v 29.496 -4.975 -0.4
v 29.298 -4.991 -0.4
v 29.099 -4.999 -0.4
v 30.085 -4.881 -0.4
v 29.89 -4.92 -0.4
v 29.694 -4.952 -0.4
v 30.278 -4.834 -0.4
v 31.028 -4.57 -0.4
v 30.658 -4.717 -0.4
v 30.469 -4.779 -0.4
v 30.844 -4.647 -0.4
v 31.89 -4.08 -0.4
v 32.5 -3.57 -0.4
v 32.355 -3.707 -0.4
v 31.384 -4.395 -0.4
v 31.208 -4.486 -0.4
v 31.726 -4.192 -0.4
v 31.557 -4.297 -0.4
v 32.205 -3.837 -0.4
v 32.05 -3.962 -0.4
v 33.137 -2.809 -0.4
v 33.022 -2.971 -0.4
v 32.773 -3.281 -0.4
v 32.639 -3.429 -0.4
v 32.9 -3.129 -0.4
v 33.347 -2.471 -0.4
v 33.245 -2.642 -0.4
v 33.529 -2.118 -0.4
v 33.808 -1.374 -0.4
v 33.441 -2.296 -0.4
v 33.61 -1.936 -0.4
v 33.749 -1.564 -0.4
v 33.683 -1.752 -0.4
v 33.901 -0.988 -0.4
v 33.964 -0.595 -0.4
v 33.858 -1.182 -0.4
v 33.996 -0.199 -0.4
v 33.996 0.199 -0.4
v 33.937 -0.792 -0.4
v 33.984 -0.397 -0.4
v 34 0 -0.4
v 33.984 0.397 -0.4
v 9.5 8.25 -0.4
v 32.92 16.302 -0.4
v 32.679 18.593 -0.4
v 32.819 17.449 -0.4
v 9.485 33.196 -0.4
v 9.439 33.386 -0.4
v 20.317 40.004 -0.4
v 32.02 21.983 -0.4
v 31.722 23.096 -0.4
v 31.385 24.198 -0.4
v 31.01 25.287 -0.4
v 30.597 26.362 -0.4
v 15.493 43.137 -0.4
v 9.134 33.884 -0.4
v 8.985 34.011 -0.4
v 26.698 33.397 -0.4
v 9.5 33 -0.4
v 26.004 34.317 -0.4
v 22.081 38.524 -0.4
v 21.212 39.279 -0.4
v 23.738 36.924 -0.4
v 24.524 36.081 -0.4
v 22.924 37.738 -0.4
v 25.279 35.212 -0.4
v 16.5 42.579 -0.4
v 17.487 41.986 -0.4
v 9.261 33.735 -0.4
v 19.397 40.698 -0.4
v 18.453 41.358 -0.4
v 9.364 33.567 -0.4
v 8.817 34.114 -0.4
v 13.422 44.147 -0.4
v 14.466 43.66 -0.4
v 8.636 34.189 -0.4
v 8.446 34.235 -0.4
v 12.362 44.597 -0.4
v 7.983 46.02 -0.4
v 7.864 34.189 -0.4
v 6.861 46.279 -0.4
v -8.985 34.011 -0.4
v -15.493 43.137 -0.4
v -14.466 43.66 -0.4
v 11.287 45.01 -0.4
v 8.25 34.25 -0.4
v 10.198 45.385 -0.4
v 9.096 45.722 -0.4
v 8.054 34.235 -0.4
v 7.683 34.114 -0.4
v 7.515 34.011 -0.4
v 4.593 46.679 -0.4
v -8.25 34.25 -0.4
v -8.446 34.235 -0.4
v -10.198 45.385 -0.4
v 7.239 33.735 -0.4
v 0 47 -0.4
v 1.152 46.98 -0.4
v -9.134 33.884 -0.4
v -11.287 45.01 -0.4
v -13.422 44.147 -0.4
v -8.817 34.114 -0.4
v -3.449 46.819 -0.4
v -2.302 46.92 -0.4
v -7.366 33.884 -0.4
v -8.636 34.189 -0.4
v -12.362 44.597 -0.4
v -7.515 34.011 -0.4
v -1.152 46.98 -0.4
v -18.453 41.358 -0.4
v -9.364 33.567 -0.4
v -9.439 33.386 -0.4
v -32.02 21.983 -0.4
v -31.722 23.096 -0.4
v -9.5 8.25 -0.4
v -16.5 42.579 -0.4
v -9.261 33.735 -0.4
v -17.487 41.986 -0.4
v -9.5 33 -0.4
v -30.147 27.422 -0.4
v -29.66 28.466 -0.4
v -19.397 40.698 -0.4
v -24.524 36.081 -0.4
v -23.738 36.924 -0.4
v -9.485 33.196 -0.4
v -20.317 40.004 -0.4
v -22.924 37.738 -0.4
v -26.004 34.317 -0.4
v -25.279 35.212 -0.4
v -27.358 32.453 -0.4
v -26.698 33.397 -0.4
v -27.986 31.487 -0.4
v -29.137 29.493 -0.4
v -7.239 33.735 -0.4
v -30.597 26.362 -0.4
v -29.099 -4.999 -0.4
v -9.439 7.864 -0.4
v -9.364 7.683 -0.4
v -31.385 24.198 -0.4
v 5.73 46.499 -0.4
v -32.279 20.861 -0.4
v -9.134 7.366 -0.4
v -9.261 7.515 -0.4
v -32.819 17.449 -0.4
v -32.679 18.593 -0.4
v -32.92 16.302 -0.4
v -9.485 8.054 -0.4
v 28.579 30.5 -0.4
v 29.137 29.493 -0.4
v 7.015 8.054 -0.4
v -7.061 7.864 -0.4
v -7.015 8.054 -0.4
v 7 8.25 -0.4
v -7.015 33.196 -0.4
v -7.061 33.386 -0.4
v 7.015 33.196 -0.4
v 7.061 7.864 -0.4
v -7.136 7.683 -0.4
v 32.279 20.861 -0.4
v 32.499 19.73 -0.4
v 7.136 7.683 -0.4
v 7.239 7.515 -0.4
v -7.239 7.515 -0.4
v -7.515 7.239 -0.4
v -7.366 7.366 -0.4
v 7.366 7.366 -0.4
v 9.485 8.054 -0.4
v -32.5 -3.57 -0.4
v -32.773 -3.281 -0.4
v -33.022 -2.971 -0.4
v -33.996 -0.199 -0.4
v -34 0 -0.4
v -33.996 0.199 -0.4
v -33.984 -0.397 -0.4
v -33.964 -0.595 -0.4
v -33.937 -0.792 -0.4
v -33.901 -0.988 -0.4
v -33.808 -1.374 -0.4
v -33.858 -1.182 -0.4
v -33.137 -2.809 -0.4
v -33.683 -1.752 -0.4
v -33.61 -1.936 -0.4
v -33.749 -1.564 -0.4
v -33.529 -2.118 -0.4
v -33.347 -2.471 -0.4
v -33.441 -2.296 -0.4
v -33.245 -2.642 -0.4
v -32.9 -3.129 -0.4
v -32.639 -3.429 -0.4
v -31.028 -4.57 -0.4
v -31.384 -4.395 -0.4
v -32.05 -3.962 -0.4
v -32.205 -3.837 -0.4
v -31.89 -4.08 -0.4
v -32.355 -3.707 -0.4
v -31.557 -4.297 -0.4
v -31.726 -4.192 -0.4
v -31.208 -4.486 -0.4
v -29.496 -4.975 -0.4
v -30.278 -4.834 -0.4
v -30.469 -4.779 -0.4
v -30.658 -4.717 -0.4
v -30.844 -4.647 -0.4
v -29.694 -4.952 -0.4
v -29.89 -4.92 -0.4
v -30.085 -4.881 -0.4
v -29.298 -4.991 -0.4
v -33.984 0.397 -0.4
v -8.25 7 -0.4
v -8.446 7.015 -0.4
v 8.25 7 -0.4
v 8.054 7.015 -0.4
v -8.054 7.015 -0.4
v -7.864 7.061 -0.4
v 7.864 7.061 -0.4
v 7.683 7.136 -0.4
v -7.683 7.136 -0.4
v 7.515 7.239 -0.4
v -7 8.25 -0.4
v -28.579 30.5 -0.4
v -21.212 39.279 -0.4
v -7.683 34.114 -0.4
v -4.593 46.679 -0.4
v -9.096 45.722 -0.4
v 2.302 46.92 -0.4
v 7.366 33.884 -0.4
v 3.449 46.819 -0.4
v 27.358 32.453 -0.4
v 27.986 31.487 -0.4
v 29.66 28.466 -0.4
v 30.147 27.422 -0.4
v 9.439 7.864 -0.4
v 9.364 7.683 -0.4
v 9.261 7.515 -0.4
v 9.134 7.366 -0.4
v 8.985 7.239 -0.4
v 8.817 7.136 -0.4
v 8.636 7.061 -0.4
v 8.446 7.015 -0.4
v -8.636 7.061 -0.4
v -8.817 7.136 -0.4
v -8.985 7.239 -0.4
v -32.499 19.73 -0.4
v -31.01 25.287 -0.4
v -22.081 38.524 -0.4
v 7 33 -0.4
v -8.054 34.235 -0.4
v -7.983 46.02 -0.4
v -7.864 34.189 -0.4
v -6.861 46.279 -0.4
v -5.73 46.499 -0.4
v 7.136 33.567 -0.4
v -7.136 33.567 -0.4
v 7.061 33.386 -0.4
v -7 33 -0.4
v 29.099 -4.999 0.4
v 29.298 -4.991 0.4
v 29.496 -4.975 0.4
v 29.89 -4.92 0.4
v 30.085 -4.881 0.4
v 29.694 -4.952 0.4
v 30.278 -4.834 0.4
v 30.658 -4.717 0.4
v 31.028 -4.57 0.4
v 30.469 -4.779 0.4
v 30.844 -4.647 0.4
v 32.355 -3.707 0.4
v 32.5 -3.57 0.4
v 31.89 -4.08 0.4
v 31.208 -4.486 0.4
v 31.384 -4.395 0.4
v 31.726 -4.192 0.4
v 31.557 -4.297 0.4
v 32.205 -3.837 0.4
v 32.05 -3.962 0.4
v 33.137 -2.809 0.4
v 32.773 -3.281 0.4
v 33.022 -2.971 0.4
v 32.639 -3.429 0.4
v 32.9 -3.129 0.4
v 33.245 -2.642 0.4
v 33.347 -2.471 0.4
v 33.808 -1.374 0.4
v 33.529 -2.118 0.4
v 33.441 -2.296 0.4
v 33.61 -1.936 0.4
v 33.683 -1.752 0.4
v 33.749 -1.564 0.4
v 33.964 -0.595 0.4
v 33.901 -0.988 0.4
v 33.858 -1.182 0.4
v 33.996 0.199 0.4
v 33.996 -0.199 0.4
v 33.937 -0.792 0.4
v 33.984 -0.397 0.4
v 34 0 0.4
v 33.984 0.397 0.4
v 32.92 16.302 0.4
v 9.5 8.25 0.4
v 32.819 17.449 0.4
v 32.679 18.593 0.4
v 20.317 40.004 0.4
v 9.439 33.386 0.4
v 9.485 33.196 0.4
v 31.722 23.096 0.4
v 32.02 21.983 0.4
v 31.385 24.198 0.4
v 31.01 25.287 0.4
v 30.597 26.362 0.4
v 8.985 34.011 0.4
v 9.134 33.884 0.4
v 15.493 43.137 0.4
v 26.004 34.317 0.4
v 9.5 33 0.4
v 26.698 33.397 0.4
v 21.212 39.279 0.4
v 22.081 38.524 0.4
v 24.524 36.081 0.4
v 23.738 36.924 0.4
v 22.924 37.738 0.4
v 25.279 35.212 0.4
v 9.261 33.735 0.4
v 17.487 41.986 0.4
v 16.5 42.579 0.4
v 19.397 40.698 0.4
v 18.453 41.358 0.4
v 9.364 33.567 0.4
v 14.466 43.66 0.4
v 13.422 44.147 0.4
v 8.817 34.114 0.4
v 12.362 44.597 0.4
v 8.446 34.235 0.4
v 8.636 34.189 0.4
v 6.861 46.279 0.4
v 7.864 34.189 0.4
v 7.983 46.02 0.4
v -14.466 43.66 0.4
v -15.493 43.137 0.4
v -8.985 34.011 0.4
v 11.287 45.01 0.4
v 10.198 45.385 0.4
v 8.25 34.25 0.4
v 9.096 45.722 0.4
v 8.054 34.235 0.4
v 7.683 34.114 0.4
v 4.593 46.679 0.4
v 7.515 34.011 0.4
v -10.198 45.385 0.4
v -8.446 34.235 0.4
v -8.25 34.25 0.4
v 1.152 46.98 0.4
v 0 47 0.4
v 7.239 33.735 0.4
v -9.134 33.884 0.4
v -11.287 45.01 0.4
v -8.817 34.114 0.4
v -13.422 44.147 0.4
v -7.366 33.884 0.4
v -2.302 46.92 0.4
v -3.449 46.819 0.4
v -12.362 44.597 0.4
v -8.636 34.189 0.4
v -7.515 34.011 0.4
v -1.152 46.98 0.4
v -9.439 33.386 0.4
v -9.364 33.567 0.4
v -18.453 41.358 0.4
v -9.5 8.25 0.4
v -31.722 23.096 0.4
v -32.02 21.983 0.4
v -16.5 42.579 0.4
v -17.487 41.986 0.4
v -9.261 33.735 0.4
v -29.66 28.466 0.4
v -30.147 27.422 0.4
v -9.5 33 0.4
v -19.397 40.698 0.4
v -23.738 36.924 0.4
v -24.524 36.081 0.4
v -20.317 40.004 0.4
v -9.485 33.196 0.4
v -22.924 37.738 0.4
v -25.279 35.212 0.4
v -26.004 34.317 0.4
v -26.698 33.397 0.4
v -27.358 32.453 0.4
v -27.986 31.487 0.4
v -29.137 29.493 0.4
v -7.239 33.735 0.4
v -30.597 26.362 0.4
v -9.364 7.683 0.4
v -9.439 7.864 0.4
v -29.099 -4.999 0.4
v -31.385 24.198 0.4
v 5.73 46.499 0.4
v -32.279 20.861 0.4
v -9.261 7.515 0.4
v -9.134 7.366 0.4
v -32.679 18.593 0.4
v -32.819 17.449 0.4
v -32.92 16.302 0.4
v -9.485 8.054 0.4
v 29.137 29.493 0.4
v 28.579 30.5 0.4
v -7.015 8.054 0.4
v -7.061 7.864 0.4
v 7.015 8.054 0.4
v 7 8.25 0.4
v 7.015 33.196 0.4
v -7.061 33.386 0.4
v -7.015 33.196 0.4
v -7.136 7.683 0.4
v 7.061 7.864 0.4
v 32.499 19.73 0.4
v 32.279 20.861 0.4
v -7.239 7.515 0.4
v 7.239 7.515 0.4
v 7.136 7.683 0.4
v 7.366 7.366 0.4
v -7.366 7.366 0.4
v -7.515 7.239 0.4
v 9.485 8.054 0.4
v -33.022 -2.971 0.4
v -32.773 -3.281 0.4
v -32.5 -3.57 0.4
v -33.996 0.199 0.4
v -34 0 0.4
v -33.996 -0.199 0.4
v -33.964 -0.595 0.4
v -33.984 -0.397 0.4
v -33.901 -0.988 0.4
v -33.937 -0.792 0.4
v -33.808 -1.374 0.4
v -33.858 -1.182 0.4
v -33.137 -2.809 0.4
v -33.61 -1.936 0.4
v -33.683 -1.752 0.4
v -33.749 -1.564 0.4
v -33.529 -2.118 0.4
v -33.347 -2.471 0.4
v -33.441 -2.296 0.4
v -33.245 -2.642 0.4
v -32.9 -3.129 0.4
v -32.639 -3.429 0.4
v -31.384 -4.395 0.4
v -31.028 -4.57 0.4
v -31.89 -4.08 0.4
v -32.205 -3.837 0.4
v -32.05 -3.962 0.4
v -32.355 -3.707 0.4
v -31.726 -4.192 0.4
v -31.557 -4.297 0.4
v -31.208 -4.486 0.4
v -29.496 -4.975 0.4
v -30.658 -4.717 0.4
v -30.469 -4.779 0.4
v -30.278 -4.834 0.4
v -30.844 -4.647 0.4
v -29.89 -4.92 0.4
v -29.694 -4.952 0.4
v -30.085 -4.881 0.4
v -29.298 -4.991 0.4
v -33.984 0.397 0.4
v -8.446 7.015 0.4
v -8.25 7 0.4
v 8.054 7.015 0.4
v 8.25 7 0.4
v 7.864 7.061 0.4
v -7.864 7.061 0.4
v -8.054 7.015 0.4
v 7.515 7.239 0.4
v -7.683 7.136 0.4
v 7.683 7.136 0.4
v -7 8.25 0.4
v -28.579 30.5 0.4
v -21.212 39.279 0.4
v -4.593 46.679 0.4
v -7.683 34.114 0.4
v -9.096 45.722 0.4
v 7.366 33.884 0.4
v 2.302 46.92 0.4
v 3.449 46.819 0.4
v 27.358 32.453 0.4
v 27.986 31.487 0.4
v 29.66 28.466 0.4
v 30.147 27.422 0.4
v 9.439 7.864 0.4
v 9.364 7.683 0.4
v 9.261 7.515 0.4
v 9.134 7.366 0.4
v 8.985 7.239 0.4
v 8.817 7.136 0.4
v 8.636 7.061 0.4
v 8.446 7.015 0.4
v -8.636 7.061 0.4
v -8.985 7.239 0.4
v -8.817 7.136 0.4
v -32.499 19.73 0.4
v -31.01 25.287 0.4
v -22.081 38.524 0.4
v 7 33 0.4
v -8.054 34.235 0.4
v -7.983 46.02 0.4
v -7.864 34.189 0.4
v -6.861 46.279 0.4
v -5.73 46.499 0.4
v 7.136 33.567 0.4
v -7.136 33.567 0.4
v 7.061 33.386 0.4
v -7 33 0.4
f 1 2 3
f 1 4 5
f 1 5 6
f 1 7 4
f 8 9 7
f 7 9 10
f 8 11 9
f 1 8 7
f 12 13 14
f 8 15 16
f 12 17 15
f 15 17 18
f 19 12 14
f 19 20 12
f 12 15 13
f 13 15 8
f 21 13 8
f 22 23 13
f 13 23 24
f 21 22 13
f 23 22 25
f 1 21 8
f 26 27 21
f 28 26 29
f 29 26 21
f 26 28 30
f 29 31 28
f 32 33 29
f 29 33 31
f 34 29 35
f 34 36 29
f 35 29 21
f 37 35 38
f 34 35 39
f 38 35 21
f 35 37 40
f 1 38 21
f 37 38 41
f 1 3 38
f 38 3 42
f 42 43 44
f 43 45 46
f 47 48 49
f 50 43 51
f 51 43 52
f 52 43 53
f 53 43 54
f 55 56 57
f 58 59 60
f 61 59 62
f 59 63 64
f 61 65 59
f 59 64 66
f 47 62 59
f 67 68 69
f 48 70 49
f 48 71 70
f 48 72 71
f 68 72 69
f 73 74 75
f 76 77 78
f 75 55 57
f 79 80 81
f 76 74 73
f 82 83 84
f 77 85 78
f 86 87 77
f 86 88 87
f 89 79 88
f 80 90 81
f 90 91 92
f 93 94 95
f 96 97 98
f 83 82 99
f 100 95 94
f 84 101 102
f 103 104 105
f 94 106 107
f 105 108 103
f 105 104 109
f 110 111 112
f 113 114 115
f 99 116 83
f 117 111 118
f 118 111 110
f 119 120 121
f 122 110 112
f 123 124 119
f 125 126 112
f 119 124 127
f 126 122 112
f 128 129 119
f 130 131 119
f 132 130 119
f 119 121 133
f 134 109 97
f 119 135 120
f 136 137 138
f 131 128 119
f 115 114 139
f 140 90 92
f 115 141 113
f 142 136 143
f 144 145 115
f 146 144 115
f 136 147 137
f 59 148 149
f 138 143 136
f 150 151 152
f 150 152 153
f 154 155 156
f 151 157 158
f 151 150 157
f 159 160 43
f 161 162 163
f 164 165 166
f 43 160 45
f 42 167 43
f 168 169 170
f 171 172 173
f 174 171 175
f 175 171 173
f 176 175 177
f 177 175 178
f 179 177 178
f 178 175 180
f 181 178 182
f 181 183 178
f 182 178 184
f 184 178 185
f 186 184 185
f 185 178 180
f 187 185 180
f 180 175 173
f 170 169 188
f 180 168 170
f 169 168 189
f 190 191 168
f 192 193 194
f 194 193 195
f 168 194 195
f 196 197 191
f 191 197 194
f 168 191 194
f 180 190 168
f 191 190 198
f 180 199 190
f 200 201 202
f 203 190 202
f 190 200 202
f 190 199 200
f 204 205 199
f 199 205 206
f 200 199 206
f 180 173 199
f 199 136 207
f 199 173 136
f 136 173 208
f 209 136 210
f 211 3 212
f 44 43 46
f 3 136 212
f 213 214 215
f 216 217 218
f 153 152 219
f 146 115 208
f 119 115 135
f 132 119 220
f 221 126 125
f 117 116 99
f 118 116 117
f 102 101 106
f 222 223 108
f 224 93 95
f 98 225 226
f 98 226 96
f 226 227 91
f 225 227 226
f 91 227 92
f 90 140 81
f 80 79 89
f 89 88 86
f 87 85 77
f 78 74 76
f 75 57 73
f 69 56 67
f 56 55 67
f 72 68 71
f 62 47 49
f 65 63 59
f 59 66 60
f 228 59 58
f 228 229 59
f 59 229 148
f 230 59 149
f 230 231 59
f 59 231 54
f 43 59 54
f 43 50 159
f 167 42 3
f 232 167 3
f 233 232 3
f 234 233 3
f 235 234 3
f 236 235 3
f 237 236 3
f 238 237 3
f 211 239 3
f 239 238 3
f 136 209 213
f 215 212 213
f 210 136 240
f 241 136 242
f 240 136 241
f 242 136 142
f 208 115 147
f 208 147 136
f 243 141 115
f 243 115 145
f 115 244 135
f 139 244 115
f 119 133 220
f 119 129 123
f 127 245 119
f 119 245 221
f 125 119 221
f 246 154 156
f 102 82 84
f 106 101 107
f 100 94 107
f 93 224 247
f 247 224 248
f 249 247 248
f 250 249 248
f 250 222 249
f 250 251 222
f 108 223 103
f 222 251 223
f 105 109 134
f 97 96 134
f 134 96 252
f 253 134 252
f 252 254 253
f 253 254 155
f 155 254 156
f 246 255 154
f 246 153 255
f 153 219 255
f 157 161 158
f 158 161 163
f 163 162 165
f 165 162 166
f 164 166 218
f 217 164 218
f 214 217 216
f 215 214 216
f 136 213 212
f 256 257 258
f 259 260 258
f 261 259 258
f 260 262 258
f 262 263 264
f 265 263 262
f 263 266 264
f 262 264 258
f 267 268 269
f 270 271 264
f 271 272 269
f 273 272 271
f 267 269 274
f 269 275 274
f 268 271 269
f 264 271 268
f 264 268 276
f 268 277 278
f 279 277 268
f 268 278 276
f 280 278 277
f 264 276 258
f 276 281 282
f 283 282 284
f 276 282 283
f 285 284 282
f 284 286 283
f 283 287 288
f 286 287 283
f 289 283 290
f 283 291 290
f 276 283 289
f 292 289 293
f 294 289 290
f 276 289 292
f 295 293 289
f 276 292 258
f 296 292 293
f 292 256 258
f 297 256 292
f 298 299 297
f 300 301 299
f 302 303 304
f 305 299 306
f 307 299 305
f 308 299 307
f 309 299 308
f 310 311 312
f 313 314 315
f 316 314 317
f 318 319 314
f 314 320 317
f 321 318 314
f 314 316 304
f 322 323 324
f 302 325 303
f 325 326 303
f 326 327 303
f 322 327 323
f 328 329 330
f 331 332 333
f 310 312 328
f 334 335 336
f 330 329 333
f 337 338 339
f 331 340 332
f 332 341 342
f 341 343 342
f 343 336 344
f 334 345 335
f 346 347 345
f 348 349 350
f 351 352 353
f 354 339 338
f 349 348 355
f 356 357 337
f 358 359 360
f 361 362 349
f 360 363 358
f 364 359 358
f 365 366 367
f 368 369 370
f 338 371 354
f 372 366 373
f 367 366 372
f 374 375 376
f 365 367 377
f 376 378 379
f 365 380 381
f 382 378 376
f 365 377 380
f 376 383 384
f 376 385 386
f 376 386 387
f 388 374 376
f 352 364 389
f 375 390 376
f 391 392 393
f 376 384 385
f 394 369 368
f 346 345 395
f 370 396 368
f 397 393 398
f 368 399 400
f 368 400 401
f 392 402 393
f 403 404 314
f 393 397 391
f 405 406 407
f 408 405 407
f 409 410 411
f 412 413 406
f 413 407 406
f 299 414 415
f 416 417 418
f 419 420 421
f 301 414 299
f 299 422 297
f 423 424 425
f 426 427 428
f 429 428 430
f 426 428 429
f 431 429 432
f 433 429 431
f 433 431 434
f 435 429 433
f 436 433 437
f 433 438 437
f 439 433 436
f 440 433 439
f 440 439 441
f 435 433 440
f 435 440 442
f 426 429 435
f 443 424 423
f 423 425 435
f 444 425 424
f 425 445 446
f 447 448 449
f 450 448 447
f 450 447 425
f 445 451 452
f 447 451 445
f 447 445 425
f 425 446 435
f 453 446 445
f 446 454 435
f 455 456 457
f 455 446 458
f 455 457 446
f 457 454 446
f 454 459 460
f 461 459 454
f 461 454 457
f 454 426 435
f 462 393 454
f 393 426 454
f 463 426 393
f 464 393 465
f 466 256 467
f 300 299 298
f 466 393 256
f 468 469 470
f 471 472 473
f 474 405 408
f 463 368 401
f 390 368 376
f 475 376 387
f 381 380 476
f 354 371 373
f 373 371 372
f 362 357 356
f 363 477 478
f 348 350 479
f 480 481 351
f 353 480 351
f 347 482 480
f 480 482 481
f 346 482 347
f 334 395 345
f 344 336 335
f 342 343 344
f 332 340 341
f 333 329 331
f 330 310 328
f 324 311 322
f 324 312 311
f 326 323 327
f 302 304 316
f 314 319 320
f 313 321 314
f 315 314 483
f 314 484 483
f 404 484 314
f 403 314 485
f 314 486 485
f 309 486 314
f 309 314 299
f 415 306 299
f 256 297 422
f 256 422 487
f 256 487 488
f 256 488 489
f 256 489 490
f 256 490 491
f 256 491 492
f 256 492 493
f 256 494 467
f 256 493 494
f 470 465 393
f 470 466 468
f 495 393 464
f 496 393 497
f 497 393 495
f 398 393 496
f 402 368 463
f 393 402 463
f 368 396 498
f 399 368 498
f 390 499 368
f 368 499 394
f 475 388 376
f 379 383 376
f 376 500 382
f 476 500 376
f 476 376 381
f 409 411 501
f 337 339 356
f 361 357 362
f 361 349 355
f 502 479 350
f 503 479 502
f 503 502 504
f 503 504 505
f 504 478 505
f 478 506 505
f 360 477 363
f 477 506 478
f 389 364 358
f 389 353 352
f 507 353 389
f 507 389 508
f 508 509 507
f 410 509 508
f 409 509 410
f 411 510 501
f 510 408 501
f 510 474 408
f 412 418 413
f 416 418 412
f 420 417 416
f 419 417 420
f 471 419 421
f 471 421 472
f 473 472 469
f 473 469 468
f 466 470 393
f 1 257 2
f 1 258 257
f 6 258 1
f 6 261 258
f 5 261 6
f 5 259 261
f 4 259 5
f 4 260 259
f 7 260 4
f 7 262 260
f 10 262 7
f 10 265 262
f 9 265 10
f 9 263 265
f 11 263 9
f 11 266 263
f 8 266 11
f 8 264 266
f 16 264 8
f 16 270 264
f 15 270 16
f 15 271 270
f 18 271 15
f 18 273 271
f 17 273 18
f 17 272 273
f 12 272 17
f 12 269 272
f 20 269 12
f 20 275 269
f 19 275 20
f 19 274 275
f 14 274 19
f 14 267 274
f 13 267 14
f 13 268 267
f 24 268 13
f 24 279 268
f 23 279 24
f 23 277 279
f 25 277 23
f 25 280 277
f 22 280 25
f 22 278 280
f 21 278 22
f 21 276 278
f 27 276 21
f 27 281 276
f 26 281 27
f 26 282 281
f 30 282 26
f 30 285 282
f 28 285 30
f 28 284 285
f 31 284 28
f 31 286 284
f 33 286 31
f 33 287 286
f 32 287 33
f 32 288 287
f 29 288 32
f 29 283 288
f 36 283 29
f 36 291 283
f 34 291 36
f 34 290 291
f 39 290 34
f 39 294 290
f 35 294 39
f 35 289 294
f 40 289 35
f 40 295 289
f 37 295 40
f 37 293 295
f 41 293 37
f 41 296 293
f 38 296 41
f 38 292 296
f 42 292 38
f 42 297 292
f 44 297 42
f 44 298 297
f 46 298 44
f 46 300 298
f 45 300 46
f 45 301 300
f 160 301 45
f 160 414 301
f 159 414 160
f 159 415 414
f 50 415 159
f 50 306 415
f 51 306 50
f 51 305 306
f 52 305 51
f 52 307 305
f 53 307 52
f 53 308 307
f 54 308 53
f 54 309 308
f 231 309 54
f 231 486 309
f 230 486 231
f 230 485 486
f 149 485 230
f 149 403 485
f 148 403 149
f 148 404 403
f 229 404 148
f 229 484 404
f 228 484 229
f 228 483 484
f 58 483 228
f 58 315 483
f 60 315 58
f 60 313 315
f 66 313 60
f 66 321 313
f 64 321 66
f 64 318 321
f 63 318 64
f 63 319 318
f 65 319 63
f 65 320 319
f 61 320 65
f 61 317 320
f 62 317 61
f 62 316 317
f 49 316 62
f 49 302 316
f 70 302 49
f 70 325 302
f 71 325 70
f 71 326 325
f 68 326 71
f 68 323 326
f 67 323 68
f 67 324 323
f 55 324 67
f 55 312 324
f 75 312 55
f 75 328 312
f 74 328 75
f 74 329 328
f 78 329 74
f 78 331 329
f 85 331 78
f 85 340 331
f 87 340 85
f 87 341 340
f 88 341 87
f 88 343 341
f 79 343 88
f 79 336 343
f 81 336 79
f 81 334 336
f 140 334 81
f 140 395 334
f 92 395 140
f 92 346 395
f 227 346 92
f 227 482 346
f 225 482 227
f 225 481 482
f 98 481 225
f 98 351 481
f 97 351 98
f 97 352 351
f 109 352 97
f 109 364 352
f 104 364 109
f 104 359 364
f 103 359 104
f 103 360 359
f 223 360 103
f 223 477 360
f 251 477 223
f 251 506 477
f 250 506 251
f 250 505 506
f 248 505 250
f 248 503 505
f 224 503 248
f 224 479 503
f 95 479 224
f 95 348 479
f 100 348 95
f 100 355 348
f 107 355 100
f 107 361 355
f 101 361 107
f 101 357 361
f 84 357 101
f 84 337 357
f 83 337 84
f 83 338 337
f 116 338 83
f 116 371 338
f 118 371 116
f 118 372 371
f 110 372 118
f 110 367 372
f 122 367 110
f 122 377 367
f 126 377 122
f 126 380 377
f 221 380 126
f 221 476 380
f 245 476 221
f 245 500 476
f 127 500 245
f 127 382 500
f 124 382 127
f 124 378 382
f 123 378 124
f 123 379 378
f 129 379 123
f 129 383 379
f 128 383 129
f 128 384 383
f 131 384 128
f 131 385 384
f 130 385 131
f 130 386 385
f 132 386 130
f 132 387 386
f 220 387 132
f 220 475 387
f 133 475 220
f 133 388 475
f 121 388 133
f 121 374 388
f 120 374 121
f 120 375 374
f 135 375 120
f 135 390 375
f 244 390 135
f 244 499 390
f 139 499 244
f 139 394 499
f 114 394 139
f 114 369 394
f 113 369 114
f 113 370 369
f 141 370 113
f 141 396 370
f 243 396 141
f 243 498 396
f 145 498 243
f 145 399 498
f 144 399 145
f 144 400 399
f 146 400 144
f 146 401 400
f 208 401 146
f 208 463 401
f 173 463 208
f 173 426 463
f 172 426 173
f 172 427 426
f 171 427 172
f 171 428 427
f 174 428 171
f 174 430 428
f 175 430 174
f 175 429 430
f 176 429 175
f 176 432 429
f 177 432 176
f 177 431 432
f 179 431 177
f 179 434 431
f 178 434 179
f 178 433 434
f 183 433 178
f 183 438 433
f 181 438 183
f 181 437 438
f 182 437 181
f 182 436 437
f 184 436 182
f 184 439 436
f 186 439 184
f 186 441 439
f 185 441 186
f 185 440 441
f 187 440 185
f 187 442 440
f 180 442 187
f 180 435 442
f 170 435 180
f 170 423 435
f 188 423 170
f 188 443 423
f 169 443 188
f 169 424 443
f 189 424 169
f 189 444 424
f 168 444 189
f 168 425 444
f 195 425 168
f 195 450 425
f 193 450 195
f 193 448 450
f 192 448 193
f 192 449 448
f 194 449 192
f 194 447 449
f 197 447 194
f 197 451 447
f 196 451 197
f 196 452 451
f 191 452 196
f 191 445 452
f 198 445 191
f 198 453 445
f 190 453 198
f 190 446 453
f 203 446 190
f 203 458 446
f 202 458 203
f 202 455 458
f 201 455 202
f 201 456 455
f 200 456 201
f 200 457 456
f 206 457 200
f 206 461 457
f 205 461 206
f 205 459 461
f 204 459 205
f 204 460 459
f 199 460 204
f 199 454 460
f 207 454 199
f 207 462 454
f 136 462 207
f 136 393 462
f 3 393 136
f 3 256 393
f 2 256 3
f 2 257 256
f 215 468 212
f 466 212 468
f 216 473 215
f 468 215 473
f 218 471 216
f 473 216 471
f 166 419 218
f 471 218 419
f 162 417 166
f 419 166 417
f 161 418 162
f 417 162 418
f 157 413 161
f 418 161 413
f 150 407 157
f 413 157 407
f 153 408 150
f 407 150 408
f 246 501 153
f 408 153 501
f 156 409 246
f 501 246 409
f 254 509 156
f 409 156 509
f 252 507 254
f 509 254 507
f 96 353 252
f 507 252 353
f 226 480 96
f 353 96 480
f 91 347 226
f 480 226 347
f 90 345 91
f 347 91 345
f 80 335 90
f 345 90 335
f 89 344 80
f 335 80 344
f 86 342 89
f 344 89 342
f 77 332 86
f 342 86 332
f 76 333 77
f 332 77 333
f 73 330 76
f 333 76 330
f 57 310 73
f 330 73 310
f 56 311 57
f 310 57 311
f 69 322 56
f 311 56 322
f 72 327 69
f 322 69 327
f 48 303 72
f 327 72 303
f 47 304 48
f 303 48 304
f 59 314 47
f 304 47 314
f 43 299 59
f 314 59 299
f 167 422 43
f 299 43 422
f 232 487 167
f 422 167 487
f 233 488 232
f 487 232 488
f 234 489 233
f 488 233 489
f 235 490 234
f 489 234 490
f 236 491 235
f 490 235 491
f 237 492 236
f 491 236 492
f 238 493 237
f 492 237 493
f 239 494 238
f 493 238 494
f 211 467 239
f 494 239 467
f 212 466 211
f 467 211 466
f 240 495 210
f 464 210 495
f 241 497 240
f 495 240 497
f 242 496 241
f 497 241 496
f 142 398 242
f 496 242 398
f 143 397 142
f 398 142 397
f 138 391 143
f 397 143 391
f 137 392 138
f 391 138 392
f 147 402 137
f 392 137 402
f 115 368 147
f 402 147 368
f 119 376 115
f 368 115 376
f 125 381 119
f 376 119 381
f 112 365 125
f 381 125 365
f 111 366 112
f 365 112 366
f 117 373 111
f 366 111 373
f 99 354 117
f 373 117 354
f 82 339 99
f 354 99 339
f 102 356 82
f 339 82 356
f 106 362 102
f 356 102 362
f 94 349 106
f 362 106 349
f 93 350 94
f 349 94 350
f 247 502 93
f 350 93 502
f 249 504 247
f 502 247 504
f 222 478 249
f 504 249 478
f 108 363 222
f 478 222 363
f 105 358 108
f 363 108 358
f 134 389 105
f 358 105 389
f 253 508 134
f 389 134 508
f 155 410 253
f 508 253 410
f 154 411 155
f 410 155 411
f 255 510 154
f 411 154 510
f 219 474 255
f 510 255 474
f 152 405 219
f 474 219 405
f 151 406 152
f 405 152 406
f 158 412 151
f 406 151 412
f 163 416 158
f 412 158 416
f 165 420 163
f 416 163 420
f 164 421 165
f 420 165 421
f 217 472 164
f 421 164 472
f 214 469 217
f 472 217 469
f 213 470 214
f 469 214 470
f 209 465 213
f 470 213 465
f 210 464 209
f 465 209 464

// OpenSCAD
/*
Generate a Hakko FX-888 soldering sponge template to be printed on FDM 3D printer 

GNU General Public License v3.0
Permissions of this strong copyleft license are conditioned on making available complete source
code of licensed works and modifications, which include larger works using a licensed work, under
the same license. Copyright and license notices must be preserved. Contributors provide an express
grant of patent rights.
*/

// Variables default values
scaling_factor = 100; // [1:100]
layer_heigth = 0.2;
number_of_layers = 4;
label = false;
label_font="Liberation Sans:style=Bold";

/* [Hidden] */
width = 68;
length = 52;
filet = 5;
radius = 33;
$fa=2; // default minimum facet angle
$fs=0.2; // default minimum facet size

module fx888_sponge_template( sf = scaling_factor,
                              lh = layer_heigth,
                              nl = number_of_layers,
                              lb = label ) {

  module sponge_surface() {
    hull() {
      for (i = [0:1:1]) {
        mirror([i, 0, 0]) {
          translate([width/2-filet, 0, 0]) {
            circle(r = filet);
          }
        }
      }
      difference() {
        translate([0, length-radius-filet, 0]) {
          circle(r = radius);
        }
        translate([0, -radius/2, 0]) {
          square([width, radius], true);
        }
      }
    }
  }

  module sponge_holes() {
    for (j = [0:1]) {
      mirror([j, 0, 0]) hull() for (i = [1:3:4]) {
        translate([radius/4, radius/i, 0]) circle(d = filet/2);
      }
    }
  }

  module scalling_factor_label() {
    translate([0, 0, ceil(nl/2)*lh/2]) {
      linear_extrude(height = ceil(nl/2)*lh, center = true, convexity = 10, twist = 0) {
        scale([sf/100, sf/100, 0]) rotate([0, 0, 180]) resize([0, filet], auto=true) {
          text(str(sf, "%"), valign = "center", halign = "center", font = label_font);
        }
      }
    }
  }

  // Main
  difference() {
    linear_extrude(height = nl*lh, center = true, convexity = 10, twist = 0) {
     scale([sf/100, sf/100, 0])  difference() {
        sponge_surface();
        sponge_holes();
      }
    }
    if (lb) scalling_factor_label();
  }
}

// Customizer instance
fx888_sponge_template();
